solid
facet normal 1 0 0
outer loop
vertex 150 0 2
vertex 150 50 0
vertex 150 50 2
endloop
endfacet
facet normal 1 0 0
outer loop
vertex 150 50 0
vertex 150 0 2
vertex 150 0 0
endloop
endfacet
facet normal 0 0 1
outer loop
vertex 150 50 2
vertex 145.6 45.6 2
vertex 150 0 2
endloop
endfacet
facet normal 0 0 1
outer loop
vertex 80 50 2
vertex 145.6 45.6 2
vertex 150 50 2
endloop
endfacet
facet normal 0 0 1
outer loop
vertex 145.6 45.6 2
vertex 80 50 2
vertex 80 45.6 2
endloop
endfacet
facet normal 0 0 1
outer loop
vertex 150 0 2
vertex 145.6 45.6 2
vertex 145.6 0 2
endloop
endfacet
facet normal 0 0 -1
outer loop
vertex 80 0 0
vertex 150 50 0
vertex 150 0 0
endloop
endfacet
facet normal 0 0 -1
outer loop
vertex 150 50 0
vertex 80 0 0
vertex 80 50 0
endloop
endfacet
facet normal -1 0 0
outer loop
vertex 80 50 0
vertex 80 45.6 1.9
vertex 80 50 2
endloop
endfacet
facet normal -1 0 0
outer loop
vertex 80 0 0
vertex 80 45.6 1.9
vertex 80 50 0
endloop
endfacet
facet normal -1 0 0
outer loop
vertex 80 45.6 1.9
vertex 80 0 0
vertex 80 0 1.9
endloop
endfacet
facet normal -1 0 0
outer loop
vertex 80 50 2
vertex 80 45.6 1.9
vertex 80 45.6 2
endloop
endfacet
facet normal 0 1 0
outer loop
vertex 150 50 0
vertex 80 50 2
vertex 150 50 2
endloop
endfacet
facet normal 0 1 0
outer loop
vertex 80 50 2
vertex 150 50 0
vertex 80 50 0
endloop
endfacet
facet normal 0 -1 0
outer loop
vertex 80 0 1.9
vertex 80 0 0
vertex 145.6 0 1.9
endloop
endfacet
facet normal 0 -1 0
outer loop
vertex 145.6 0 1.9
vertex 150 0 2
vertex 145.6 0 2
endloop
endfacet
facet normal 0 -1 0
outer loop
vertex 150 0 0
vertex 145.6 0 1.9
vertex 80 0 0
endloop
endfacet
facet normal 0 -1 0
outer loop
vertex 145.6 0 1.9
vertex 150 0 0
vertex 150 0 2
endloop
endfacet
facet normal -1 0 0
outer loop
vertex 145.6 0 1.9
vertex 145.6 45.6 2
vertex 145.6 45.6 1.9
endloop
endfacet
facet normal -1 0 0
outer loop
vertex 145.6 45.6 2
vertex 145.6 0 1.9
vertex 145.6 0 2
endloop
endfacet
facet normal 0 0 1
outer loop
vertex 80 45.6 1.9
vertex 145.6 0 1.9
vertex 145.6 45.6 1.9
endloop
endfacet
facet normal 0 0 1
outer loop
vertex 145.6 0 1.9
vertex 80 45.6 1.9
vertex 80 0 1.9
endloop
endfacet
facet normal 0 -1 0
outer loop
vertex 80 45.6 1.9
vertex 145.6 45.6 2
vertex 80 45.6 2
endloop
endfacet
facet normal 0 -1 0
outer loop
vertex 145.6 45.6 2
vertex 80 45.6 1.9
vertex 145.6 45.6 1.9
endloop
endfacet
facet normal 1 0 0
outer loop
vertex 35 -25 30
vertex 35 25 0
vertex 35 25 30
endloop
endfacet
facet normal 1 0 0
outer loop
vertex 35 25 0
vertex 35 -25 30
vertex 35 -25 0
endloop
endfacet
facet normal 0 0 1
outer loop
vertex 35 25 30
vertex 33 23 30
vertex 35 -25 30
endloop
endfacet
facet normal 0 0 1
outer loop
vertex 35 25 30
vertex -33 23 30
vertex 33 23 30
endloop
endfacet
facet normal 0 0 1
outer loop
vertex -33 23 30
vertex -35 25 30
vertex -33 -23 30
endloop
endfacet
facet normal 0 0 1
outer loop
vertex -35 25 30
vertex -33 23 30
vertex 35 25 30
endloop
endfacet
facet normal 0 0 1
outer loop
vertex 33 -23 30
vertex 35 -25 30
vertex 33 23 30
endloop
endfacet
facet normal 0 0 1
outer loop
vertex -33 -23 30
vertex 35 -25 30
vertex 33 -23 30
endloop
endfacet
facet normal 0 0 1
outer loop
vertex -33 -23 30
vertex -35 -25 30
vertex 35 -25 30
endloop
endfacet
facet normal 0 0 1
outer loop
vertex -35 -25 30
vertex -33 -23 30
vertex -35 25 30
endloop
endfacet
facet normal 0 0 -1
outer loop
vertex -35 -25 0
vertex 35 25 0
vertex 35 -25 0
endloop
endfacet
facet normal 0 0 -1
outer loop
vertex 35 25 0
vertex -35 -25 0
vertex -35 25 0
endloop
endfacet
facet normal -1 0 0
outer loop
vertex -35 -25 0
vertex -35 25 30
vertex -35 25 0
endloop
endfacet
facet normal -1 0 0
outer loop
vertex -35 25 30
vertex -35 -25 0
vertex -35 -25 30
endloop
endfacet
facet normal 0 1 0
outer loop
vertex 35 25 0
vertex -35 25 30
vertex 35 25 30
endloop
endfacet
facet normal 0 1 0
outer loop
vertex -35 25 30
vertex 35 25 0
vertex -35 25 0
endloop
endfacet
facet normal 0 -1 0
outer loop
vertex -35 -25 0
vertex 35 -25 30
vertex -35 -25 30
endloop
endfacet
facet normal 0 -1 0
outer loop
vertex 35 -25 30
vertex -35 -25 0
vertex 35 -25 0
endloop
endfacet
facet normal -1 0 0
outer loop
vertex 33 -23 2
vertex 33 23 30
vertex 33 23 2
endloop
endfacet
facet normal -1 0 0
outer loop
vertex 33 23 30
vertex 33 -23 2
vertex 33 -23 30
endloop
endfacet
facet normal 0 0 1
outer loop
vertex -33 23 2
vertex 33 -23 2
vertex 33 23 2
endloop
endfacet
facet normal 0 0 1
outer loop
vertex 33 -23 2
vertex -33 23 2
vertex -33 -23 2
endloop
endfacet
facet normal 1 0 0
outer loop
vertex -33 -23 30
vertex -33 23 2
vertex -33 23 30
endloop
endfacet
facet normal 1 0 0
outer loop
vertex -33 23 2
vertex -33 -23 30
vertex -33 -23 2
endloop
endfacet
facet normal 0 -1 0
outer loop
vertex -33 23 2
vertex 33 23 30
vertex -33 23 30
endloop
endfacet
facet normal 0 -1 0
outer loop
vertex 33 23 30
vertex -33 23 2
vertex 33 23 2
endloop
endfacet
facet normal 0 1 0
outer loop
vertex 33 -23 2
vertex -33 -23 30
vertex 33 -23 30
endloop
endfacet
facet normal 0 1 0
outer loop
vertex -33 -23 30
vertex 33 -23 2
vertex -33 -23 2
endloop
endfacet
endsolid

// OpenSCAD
// ====================================================================
// Parameters for the Enclosure and Lid
// ====================================================================

// Box Dimensions (Outer)
box_outer_x = 70; // Outer X dimension of the box (mm)
box_outer_y = 50; // Outer Y dimension of the box (mm)
box_outer_z = 30; // Outer Z dimension of the box (mm)

// Box Wall/Floor Thickness
wall_thickness = 2; // Wall and floor thickness (mm)

// Lid Dimensions
lid_plate_x = 70;   // Plate X dimension of the lid (mm)
lid_plate_y = 50;   // Plate Y dimension of the lid (mm)
lid_plate_z = 2;    // Thickness of the main plate (mm)

lip_wall_thickness = 1.5; // Wall thickness of the lip (mm)
lip_height = 4;        // Height of the lip (mm)

// Clearance for sliding fit
clearance = 0.2; // Total clearance needed on each side (mm)

// Gap between parts when printing together
print_gap = 10; // Gap between box and lid in X direction (mm)

// Resolution setting for curves
$fn = 64;

// ====================================================================
// Part 1: The Box
// ====================================================================

module enclosure_box() {
    // Calculate inner dimensions
    inner_x = box_outer_x - (2 * wall_thickness);
    inner_y = box_outer_y - (2 * wall_thickness);
    inner_z = box_outer_z - wall_thickness; // Open top

    difference() {
        // 1. Outer shell (Solid block)
        cube([box_outer_x, box_outer_y, box_outer_z]);

        // 2. Cut out the interior space
        translate([wall_thickness, wall_thickness, wall_thickness]) {
            cube([inner_x, inner_y, inner_z]);
        }
    }
}

// ====================================================================
// Part 2: The Lid
// ====================================================================

module enclosure_lid() {
    // Calculate the dimensions of the lip structure
    // Outer size of the lip section (must fit into box opening with clearance)
    lip_outer_x = lid_plate_x - (2 * clearance); // 70 - 0.4 = 69.6? No, use specified outer size: 65.6 x 45.6
    lip_outer_y = lid_plate_y - (2 * clearance);

    // Specified outer dimensions for the lip section
    specified_lip_x = 65.6;
    specified_lip_y = 45.6;

    // Calculate inner dimensions of the lip wall
    lip_inner_x = specified_lip_x - (2 * lip_wall_thickness);
    lip_inner_y = specified_lip_y - (2 * lip_wall_thickness);

    difference() {
        // 1. Main plate body (70 x 50 x 2)
        cube([lid_plate_x, lid_plate_y, lid_plate_z]);

        // 2. Cut out the space where the lip sits on top of the main plate
        // This cut must be centered on the plate and extend through its thickness (2mm) + slightly more for safety
        translate([0, 0, lid_plate_z - 0.1]) { // Start cutting just below the surface
            cube([specified_lip_x, specified_lip_y, lip_height + 0.5]);
        }

        // 3. Cut out the hollow space inside the lip structure (to make it a wall)
        // This cut is performed on the top face of the plate
        translate([
            (lid_plate_x - specified_lip_x) / 2, // Center X offset
            (lid_plate_y - specified_lip_y) / 2, // Center Y offset
            lid_plate_z + lip_height - 0.1 // Start cutting from the top surface of the lip structure
        ]) {
            cube([lip_inner_x, lip_inner_y, lip_height + 0.5]);
        }
    }
}

// ====================================================================
// Assembly and Rendering
// ====================================================================

// The lid is printed upside down (Z=0 is the bottom of the plate)
// The box rests on Z=0. We place the lid next to it in X.

translate([box_outer_x + print_gap, 0, 0]) {
    enclosure_lid();
}

// Place the box at the origin (centered in XY plane relative to its own dimensions)
// Since we want it centered on the bed, and we are placing the lid next to it,
// we center the box around X=0 for simplicity of placement.
translate([-(box_outer_x / 2), -(box_outer_y / 2), 0]) {
    enclosure_box();
}
